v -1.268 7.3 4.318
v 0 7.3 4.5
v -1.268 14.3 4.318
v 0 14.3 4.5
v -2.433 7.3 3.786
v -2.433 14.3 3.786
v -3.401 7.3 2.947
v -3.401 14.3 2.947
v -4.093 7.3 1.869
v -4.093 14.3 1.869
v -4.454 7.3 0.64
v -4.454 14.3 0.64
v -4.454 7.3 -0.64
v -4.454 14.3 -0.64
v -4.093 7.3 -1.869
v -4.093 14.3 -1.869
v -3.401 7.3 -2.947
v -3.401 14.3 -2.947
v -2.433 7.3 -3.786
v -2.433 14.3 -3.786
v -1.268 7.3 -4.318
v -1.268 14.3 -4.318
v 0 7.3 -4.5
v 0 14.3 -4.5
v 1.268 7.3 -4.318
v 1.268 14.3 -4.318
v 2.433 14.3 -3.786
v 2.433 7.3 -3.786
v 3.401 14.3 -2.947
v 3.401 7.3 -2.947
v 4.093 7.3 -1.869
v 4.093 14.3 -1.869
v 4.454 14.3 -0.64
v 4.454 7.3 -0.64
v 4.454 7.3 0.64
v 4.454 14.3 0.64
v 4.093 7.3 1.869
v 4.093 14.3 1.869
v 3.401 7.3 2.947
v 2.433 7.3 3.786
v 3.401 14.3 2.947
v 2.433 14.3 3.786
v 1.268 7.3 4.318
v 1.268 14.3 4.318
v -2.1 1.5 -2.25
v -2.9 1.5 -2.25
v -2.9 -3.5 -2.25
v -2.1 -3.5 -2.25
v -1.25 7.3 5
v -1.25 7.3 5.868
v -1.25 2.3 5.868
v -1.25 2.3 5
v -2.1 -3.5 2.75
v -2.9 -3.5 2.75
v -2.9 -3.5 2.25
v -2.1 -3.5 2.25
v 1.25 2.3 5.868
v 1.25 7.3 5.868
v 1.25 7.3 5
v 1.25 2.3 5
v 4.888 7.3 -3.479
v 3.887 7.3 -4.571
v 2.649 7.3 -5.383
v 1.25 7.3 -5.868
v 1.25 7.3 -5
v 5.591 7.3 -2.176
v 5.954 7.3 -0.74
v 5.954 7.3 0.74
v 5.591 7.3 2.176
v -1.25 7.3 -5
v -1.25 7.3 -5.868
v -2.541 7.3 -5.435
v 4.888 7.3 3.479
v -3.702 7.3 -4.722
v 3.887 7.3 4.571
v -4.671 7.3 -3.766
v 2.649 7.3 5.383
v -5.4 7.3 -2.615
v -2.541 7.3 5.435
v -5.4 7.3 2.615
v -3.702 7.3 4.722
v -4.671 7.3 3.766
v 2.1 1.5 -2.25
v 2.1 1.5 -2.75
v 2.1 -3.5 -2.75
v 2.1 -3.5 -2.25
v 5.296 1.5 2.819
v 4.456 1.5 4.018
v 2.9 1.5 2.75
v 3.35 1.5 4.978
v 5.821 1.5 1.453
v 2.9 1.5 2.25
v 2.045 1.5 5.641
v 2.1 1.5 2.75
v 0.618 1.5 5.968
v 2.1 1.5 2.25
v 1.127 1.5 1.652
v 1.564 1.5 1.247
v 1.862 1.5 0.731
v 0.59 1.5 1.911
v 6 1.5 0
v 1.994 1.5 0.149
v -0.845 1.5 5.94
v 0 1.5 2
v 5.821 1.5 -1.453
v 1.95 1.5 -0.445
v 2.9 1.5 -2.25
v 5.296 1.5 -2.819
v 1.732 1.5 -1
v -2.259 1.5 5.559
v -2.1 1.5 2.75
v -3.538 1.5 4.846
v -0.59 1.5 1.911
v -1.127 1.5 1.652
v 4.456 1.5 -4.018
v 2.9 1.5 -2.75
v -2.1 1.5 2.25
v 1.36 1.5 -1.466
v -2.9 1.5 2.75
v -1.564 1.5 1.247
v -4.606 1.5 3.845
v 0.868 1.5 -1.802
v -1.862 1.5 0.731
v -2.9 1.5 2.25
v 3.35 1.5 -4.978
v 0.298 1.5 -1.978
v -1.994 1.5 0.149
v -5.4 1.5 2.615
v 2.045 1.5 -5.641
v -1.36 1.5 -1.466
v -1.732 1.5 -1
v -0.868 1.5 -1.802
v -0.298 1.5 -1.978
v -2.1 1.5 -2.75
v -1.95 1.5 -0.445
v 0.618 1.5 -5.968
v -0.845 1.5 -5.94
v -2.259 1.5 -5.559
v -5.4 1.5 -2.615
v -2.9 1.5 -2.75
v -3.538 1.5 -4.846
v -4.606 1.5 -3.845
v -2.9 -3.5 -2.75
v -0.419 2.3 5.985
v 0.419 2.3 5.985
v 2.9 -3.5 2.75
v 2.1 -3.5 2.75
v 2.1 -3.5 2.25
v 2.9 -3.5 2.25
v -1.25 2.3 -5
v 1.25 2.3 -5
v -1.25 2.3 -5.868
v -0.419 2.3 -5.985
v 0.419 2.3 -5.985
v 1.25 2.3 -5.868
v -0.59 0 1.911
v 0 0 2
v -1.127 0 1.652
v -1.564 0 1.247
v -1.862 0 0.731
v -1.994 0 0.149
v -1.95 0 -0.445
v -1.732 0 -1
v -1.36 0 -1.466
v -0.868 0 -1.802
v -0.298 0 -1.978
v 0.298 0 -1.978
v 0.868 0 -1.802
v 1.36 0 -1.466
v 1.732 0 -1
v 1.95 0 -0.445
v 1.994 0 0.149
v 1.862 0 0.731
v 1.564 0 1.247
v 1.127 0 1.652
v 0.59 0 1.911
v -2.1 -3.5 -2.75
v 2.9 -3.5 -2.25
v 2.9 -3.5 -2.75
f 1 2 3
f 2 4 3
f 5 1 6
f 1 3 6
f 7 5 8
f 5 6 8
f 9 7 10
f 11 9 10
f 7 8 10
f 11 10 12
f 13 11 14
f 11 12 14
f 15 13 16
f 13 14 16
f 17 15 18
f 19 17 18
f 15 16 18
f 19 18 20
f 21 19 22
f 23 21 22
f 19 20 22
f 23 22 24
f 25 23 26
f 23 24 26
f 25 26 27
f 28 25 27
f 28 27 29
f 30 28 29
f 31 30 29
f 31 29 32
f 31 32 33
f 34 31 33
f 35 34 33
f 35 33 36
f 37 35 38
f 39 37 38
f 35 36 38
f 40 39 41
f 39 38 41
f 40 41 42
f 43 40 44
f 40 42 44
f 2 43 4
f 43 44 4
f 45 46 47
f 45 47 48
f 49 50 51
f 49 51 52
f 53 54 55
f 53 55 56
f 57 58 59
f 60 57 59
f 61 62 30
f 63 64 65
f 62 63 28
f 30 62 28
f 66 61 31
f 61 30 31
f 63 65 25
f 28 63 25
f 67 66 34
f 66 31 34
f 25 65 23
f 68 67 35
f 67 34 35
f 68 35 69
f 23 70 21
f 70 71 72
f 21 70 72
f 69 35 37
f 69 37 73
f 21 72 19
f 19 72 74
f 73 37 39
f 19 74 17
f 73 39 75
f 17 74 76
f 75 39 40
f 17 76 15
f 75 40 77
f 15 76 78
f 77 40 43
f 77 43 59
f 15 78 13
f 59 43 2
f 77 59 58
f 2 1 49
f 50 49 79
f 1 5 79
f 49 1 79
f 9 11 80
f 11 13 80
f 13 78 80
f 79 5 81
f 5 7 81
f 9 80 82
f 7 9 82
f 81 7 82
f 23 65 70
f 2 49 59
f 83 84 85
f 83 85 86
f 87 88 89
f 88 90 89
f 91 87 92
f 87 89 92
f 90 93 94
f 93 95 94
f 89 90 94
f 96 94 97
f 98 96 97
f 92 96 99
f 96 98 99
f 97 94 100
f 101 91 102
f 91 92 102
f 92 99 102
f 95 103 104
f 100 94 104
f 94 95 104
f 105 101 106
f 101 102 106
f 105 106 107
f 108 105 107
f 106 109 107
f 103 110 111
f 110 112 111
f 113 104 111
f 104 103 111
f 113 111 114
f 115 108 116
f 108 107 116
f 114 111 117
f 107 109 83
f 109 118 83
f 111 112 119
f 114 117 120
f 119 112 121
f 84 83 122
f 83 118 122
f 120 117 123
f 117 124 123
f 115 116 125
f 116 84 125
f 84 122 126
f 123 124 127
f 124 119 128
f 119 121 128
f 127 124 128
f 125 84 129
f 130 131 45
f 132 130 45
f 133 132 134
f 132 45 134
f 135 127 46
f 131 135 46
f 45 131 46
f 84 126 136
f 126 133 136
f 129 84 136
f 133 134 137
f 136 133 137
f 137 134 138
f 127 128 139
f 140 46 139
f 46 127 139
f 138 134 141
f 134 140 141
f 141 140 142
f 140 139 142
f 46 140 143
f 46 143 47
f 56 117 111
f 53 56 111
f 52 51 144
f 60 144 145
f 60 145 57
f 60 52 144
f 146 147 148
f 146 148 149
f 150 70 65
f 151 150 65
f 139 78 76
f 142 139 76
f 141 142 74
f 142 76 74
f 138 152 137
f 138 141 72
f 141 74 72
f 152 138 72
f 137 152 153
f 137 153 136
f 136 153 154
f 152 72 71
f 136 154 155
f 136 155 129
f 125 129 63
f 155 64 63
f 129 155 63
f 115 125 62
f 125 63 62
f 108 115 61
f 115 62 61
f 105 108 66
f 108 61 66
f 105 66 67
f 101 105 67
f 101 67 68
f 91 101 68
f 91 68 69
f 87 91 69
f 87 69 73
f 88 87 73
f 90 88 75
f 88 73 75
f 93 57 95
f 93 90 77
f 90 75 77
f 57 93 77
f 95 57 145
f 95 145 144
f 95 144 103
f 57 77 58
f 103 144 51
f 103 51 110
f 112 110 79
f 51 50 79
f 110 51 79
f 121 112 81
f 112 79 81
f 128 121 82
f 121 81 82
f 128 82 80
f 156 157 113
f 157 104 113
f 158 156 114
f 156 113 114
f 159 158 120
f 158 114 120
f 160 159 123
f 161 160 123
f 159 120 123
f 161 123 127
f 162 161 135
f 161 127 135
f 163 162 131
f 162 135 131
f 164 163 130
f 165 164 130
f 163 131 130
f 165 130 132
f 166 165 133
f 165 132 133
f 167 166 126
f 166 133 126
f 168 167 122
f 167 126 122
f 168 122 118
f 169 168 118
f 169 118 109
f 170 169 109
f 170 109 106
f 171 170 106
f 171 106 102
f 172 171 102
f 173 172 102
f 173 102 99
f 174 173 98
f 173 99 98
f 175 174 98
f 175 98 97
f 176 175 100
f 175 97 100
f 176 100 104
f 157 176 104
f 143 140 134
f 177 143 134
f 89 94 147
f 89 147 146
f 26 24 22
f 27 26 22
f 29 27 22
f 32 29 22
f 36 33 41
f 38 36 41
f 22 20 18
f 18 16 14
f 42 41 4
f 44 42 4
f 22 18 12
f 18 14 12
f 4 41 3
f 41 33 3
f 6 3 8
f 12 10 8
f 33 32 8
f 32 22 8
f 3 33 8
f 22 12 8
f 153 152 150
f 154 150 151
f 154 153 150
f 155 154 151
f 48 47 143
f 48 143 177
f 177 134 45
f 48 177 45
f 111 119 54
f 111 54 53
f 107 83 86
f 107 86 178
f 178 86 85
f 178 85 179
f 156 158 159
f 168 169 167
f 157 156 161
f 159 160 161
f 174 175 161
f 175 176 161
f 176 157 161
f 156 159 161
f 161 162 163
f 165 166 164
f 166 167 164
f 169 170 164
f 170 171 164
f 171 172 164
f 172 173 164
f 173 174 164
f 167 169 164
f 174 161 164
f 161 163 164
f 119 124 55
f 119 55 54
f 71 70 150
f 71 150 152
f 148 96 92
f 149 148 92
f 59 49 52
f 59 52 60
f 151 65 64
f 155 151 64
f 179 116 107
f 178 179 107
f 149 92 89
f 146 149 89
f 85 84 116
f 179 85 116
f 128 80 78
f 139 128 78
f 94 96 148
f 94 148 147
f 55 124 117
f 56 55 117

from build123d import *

# Parameters (mm, degrees)
SKETCH2_W      = 0.8
SKETCH2_H      = 0.5
LEGS_DEPTH     = 5
SKETCH3_W      = 4.6
SKETCH3_H      = 13.743650636
EXTRUDE3_DEPTH = 20.719026345
SKETCH4_W      = 2.5
SKETCH4_H      = 2
EXTRUDE4_DEPTH = 5


with BuildPart() as part:
    # Sketch1 → Revolve1 (revolve)
    with BuildSketch(Plane.XY, mode=Mode.PRIVATE) as revolve1_sk:
        Polygon((0, 0), (2, 0), (2, 1.5), (6, 1.5), (6, 7.3), (4.5, 7.3), (4.5, 14.3), (0, 14.3), align=None)
    revolve(revolve1_sk.sketch.rotate(Axis((0, 33.182896664, 0), (0, -1, 0)), 90), axis=Axis((0, 33.182896664, 0), (0, -1, 0)))

    # Sketch2 → Legs (add)
    with BuildSketch(Plane.XZ.offset(-1.5)):
        with Locations((-2.5, 2.5)):
            Rectangle(SKETCH2_W, SKETCH2_H)
        with Locations((2.5, 2.5)):
            Rectangle(SKETCH2_W, SKETCH2_H)
        with Locations((2.5, -2.5)):
            Rectangle(SKETCH2_W, SKETCH2_H)
        with Locations((-2.5, -2.5)):
            Rectangle(SKETCH2_W, SKETCH2_H)
    extrude(amount=LEGS_DEPTH)

    # Sketch3 → Extrude3 (cut, through all)
    with BuildSketch(Plane(origin=(0, 14.3, 0), x_dir=(1, 0, 0), z_dir=(0, 1, 0))):
        with Locations((-7.7, -0.438016034)):
            Rectangle(SKETCH3_W, SKETCH3_H)
    extrude(amount=-EXTRUDE3_DEPTH, mode=Mode.SUBTRACT)

    # Sketch4 → Extrude4 (cut)
    with BuildSketch(Plane(origin=(0, 7.3, 0), x_dir=(1, 0, 0), z_dir=(0, 1, 0))):
        with Locations((0, 6)):
            Rectangle(SKETCH4_W, SKETCH4_H)
        with Locations((0, -6)):
            Rectangle(SKETCH4_W, SKETCH4_H)
    extrude(amount=-EXTRUDE4_DEPTH, mode=Mode.SUBTRACT)


solid = part.part
